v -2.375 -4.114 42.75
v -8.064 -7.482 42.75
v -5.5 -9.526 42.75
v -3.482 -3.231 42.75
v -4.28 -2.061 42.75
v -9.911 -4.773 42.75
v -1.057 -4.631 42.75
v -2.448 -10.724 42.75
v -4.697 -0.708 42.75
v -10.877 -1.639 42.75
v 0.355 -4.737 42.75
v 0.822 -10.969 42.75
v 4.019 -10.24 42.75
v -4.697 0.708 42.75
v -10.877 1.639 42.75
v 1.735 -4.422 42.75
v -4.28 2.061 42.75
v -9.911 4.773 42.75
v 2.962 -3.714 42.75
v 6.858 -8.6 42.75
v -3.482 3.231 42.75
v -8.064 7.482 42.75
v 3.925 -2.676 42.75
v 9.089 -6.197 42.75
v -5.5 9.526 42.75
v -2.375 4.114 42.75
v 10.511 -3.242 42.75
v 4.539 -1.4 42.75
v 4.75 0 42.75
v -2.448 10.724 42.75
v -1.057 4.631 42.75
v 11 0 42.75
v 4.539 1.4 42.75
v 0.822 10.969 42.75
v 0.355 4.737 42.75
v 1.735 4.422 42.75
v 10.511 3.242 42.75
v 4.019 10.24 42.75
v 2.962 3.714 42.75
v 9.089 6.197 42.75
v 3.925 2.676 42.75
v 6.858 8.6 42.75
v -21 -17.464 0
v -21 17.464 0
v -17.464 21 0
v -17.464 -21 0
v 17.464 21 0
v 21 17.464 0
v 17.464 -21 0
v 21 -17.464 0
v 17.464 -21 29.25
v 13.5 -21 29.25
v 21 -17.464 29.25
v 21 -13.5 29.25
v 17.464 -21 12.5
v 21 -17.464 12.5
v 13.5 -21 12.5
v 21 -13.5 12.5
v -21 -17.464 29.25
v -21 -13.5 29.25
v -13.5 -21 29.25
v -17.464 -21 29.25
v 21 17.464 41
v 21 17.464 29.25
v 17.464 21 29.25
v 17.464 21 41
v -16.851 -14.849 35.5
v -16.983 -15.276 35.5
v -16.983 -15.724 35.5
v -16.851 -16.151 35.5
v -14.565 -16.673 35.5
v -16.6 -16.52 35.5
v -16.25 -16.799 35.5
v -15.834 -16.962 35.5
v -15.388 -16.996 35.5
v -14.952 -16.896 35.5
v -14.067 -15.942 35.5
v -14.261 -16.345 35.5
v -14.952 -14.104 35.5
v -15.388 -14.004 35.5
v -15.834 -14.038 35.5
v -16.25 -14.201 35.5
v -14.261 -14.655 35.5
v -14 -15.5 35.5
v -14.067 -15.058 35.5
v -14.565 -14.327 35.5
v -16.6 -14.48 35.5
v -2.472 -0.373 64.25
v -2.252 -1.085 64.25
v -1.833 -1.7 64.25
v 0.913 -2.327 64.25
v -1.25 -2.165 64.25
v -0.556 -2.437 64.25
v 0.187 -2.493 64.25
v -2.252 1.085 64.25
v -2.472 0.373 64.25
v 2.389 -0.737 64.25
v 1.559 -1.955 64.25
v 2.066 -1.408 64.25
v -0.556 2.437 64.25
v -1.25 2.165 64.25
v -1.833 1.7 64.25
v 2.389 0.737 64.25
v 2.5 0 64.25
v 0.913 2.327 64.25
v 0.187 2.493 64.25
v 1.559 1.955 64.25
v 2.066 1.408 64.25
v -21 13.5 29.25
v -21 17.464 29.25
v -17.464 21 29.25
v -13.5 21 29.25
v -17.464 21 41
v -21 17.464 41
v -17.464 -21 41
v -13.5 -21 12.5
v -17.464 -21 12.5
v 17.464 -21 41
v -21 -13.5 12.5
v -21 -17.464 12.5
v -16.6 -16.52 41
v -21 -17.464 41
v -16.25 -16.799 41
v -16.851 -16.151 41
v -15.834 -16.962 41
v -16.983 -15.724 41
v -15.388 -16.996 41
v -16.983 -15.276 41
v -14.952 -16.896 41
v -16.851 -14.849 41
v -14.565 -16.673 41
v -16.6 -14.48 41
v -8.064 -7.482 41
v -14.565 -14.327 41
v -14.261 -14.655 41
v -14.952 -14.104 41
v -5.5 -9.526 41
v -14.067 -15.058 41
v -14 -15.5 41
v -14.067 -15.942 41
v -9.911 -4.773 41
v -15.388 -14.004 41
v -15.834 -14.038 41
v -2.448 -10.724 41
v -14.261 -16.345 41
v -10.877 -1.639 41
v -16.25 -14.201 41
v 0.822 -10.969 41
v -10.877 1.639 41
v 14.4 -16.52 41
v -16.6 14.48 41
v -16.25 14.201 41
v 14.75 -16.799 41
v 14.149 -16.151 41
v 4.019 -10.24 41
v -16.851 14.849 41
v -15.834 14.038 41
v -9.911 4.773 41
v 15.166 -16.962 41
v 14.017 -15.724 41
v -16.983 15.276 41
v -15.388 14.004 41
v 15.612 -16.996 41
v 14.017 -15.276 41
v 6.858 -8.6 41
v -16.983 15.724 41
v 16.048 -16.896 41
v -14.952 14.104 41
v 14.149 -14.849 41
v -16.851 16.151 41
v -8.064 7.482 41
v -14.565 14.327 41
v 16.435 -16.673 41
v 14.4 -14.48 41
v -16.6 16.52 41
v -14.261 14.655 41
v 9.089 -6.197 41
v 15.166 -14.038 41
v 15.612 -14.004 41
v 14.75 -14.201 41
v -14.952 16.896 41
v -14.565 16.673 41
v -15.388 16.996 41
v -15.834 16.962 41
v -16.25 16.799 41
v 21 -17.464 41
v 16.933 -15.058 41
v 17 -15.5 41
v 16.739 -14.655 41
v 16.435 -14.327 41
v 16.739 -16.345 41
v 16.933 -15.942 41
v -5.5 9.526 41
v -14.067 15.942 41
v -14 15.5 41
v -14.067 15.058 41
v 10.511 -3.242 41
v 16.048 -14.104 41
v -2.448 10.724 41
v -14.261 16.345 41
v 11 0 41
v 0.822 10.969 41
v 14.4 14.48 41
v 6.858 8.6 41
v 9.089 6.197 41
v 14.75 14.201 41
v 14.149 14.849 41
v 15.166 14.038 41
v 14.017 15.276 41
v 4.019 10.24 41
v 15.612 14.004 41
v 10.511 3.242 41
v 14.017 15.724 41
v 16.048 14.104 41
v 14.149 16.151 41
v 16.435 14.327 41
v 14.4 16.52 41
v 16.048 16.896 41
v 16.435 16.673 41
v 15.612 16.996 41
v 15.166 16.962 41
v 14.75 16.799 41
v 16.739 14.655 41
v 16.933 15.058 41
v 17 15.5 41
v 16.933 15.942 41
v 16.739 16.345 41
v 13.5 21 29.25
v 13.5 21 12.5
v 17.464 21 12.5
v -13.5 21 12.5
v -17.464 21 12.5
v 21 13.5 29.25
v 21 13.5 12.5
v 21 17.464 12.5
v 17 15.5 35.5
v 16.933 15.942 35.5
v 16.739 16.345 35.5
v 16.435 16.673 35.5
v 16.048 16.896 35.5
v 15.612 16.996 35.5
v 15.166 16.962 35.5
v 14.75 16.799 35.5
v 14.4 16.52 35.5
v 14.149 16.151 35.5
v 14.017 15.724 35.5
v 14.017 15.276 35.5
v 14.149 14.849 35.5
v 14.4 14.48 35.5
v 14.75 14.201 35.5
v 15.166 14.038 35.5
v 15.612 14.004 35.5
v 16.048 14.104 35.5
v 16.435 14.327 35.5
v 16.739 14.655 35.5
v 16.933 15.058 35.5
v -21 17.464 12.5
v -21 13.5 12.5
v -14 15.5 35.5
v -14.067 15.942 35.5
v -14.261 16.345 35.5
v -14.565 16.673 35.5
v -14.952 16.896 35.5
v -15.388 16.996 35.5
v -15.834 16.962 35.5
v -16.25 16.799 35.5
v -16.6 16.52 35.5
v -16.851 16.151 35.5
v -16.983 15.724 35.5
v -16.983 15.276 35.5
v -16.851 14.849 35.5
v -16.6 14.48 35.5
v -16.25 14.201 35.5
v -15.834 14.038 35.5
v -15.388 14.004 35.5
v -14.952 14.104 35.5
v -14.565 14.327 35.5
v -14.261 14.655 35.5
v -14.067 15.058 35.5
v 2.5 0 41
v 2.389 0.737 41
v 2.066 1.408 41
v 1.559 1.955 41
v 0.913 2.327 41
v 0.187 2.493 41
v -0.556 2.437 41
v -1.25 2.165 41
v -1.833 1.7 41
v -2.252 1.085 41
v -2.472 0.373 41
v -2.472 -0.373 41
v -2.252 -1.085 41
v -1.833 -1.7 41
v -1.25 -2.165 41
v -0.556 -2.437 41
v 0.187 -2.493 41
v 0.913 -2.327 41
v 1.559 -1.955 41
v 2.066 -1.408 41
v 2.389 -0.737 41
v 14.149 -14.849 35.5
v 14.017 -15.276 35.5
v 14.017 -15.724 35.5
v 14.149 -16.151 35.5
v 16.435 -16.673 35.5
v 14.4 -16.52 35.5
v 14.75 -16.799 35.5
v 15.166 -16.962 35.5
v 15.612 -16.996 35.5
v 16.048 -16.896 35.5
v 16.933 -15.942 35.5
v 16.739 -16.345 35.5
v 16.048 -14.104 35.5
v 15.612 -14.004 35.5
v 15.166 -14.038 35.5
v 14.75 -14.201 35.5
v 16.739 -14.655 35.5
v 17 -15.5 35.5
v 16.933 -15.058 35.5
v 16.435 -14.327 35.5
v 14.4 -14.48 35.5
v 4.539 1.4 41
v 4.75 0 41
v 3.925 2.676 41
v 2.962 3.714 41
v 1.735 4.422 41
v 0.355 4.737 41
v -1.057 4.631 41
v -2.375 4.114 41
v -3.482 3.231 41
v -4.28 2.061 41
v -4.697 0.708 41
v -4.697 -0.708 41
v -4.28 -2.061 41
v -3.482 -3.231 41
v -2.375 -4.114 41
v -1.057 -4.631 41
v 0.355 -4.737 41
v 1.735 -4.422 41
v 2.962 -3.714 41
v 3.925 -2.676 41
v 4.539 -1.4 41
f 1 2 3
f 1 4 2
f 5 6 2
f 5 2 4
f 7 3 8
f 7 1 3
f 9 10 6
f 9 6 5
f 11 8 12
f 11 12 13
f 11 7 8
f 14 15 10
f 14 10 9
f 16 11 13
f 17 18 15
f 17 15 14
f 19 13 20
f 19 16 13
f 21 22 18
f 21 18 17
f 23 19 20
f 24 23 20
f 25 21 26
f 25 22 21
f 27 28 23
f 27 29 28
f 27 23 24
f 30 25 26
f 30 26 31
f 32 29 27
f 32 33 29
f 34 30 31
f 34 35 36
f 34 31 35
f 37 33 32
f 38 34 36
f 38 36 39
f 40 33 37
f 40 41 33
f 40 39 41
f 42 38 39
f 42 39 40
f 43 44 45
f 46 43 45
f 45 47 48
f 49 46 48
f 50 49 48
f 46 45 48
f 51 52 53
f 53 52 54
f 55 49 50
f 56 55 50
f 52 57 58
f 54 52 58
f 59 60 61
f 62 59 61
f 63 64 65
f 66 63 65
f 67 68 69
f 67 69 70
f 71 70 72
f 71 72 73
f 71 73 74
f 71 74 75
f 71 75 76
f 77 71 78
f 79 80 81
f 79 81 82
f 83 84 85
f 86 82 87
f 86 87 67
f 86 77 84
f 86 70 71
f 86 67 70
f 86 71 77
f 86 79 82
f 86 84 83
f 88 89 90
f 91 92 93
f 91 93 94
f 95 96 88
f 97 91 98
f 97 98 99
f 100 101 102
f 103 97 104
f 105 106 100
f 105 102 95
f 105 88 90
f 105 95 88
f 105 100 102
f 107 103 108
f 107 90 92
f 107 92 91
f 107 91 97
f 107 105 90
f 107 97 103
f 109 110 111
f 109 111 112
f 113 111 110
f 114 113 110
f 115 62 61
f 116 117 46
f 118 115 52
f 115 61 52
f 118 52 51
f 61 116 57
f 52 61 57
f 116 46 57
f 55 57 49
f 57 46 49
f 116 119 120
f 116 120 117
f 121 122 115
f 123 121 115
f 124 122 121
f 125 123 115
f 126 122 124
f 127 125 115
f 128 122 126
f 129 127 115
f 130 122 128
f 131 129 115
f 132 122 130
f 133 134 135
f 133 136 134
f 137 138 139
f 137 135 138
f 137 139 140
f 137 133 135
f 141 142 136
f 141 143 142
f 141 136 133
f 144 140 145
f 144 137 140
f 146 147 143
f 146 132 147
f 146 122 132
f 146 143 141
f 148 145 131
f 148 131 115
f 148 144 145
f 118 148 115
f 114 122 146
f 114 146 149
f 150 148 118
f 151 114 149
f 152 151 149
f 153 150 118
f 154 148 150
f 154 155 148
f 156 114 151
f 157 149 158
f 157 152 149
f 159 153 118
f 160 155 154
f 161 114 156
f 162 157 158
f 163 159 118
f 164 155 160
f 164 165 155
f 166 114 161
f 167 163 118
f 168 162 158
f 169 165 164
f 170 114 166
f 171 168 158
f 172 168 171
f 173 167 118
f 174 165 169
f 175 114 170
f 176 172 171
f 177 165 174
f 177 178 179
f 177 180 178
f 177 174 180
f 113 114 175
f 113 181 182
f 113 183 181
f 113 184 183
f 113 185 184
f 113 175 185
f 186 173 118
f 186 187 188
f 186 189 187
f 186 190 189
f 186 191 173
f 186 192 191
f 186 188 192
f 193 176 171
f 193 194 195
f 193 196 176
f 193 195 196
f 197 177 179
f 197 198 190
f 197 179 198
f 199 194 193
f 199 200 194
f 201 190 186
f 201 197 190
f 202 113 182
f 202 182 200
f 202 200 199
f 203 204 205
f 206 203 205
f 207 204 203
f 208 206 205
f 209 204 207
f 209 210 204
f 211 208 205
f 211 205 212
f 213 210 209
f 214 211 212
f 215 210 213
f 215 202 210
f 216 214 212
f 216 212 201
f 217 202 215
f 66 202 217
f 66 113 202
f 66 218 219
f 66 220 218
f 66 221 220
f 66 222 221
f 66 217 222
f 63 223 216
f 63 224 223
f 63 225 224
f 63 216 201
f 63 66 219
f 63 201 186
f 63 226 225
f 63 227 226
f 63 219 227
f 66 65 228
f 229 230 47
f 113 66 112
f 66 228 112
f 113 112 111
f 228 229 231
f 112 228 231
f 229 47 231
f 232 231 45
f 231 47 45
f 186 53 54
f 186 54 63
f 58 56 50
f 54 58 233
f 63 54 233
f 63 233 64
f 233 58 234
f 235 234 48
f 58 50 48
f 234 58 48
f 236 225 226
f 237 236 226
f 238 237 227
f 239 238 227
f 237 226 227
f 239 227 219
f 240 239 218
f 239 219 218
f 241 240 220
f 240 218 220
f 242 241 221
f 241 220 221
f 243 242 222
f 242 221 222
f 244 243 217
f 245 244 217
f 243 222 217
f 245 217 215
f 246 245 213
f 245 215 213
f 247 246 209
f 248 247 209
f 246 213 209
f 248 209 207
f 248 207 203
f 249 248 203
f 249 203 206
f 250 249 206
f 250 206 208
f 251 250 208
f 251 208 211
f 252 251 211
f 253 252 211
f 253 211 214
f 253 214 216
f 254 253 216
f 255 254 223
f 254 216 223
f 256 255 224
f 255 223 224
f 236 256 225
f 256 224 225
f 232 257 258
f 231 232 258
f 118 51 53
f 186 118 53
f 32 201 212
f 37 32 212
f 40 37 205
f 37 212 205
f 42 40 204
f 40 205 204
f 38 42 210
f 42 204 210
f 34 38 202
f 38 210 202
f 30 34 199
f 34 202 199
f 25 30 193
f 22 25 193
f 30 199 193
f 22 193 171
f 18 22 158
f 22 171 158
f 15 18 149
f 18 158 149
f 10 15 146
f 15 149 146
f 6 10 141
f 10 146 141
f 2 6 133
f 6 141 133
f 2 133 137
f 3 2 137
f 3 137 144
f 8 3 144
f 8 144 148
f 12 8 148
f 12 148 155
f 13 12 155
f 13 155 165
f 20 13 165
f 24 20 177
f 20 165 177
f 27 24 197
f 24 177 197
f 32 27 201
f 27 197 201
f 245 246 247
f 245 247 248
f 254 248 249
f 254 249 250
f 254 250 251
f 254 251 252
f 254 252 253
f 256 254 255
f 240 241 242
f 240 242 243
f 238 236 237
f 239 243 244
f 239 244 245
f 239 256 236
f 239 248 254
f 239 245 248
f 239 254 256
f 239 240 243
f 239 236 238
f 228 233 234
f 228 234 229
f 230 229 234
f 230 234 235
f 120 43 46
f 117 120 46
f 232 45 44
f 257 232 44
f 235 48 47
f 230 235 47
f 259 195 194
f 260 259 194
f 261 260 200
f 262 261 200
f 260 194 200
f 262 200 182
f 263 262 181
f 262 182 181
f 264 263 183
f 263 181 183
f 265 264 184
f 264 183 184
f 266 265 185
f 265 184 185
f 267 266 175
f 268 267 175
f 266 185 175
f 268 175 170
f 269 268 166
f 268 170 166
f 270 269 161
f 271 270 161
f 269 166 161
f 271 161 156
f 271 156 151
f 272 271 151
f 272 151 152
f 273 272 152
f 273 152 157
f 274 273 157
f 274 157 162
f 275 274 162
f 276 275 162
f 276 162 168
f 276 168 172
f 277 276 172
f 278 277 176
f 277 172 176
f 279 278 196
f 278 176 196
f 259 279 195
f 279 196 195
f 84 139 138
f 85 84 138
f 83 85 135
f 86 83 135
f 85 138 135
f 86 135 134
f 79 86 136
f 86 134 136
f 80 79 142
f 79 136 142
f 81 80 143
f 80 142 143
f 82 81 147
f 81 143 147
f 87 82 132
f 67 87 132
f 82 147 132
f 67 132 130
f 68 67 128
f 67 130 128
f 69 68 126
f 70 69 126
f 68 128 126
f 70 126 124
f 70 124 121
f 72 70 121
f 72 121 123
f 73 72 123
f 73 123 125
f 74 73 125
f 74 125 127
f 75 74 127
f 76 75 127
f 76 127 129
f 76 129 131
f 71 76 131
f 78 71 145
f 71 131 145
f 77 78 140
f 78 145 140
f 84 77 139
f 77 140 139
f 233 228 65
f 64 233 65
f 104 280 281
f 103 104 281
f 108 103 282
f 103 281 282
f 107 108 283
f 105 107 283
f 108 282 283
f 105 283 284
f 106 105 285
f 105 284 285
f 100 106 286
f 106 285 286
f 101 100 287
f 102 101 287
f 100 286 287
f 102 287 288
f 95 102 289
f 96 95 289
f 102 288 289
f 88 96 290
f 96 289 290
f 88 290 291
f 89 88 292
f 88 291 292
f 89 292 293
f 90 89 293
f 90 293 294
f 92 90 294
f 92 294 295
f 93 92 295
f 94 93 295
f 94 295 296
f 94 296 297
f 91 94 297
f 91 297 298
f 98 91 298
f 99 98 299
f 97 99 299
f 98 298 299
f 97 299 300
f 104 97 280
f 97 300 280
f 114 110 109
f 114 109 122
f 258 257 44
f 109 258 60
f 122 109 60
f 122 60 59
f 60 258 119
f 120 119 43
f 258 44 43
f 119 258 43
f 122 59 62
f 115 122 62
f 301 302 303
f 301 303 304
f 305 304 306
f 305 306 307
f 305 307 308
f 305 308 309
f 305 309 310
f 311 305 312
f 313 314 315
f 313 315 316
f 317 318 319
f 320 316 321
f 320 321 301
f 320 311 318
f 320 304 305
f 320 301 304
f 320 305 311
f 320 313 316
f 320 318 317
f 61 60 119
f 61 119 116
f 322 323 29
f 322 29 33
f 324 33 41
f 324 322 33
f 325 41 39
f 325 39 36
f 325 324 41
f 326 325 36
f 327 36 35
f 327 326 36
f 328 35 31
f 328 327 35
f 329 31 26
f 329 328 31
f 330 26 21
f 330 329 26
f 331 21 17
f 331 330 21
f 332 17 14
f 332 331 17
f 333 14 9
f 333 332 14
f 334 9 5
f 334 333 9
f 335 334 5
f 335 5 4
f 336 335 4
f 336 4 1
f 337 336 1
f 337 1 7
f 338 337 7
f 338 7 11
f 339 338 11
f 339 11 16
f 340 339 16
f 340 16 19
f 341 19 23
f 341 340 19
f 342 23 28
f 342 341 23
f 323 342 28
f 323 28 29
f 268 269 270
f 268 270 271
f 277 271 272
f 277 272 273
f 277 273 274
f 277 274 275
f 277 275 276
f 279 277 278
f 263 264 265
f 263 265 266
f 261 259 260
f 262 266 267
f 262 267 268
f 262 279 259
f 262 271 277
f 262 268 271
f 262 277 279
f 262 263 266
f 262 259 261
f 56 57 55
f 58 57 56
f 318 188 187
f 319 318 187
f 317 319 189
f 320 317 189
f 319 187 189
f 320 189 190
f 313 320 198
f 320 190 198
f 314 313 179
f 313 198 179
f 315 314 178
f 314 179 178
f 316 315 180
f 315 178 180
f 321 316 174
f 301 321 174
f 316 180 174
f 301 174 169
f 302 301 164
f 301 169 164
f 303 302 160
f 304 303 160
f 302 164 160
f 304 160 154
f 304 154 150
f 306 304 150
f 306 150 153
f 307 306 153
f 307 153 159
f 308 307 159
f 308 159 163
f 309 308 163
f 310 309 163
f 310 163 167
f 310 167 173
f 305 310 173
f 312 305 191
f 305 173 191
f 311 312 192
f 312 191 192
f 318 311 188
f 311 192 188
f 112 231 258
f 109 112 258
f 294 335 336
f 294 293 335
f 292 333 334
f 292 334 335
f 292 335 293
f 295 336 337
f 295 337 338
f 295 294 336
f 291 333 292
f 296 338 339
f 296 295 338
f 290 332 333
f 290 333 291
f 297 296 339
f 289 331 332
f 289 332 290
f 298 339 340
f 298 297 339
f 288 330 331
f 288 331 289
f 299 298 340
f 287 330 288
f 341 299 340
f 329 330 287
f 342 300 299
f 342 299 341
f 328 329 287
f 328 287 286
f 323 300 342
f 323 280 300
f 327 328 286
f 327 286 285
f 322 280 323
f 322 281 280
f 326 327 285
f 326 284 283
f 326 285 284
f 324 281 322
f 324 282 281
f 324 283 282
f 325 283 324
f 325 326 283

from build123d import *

# Parameters (mm, degrees)
F1_DEPTH  = 12.5
F3_DEPTH  = 16.75
F4_START  = 29.25
F4_DEPTH  = 11.75
F5_R      = 1.5
F6_DEPTH  = 5.5
F7_R      = 11
F7_R_2    = 4.75
F8_DEPTH  = 1.75
F9_R      = 2.5
F10_DEPTH = 23.25


with BuildPart() as f1:
    # F0 (on Top) → F1 (new body)
    with BuildSketch(Plane.XY):
        Polygon((17.4644660941, 21), (-17.4644660941, 21), (-21, 17.4644660941), (-21, -17.4644660941), (-17.4644660941, -21), (17.4644660941, -21), (21, -17.4644660941), (21, 17.4644660941), align=None)
    extrude(amount=F1_DEPTH)

    # F2 (on face) → F3 (join)
    with BuildSketch(Plane.XY.offset(12.5)):
        Polygon((13.5000012147, 21), (-13.4999987853, 21), (-21, 13.4999987853), (-21, -13.5000012147), (-13.5000012147, -21), (13.4999987853, -21), (21, -13.4999987853), (21, 13.5000012147), align=None)
    extrude(amount=F3_DEPTH)

    # F0 (on Top) → F4 (join)
    with BuildSketch(Plane.XY.offset(F4_START)):
        Polygon((17.4644660941, 21), (-17.4644660941, 21), (-21, 17.4644660941), (-21, -17.4644660941), (-17.4644660941, -21), (17.4644660941, -21), (21, -17.4644660941), (21, 17.4644660941), align=None)
    extrude(amount=F4_DEPTH)

    # F5 (on face) → F6 (cut)
    with BuildSketch(Plane.XY.offset(41)):
        with Locations((-15.5, 15.5)):
            Circle(F5_R)
        with Locations((15.5, 15.5)):
            Circle(F5_R)
        with Locations((15.5, -15.5)):
            Circle(F5_R)
        with Locations((-15.5, -15.5)):
            Circle(F5_R)
    extrude(amount=-F6_DEPTH, mode=Mode.SUBTRACT)

    # F7 (on face) → F8 (join)
    with BuildSketch(Plane.XY.offset(41)):
        Circle(F7_R)
        Circle(F7_R_2, mode=Mode.SUBTRACT)
    extrude(amount=F8_DEPTH)

    # F9 (on face) → F10 (join)
    with BuildSketch(Plane.XY.offset(41)):
        Circle(F9_R)
    extrude(amount=F10_DEPTH)


solid = f1.part
